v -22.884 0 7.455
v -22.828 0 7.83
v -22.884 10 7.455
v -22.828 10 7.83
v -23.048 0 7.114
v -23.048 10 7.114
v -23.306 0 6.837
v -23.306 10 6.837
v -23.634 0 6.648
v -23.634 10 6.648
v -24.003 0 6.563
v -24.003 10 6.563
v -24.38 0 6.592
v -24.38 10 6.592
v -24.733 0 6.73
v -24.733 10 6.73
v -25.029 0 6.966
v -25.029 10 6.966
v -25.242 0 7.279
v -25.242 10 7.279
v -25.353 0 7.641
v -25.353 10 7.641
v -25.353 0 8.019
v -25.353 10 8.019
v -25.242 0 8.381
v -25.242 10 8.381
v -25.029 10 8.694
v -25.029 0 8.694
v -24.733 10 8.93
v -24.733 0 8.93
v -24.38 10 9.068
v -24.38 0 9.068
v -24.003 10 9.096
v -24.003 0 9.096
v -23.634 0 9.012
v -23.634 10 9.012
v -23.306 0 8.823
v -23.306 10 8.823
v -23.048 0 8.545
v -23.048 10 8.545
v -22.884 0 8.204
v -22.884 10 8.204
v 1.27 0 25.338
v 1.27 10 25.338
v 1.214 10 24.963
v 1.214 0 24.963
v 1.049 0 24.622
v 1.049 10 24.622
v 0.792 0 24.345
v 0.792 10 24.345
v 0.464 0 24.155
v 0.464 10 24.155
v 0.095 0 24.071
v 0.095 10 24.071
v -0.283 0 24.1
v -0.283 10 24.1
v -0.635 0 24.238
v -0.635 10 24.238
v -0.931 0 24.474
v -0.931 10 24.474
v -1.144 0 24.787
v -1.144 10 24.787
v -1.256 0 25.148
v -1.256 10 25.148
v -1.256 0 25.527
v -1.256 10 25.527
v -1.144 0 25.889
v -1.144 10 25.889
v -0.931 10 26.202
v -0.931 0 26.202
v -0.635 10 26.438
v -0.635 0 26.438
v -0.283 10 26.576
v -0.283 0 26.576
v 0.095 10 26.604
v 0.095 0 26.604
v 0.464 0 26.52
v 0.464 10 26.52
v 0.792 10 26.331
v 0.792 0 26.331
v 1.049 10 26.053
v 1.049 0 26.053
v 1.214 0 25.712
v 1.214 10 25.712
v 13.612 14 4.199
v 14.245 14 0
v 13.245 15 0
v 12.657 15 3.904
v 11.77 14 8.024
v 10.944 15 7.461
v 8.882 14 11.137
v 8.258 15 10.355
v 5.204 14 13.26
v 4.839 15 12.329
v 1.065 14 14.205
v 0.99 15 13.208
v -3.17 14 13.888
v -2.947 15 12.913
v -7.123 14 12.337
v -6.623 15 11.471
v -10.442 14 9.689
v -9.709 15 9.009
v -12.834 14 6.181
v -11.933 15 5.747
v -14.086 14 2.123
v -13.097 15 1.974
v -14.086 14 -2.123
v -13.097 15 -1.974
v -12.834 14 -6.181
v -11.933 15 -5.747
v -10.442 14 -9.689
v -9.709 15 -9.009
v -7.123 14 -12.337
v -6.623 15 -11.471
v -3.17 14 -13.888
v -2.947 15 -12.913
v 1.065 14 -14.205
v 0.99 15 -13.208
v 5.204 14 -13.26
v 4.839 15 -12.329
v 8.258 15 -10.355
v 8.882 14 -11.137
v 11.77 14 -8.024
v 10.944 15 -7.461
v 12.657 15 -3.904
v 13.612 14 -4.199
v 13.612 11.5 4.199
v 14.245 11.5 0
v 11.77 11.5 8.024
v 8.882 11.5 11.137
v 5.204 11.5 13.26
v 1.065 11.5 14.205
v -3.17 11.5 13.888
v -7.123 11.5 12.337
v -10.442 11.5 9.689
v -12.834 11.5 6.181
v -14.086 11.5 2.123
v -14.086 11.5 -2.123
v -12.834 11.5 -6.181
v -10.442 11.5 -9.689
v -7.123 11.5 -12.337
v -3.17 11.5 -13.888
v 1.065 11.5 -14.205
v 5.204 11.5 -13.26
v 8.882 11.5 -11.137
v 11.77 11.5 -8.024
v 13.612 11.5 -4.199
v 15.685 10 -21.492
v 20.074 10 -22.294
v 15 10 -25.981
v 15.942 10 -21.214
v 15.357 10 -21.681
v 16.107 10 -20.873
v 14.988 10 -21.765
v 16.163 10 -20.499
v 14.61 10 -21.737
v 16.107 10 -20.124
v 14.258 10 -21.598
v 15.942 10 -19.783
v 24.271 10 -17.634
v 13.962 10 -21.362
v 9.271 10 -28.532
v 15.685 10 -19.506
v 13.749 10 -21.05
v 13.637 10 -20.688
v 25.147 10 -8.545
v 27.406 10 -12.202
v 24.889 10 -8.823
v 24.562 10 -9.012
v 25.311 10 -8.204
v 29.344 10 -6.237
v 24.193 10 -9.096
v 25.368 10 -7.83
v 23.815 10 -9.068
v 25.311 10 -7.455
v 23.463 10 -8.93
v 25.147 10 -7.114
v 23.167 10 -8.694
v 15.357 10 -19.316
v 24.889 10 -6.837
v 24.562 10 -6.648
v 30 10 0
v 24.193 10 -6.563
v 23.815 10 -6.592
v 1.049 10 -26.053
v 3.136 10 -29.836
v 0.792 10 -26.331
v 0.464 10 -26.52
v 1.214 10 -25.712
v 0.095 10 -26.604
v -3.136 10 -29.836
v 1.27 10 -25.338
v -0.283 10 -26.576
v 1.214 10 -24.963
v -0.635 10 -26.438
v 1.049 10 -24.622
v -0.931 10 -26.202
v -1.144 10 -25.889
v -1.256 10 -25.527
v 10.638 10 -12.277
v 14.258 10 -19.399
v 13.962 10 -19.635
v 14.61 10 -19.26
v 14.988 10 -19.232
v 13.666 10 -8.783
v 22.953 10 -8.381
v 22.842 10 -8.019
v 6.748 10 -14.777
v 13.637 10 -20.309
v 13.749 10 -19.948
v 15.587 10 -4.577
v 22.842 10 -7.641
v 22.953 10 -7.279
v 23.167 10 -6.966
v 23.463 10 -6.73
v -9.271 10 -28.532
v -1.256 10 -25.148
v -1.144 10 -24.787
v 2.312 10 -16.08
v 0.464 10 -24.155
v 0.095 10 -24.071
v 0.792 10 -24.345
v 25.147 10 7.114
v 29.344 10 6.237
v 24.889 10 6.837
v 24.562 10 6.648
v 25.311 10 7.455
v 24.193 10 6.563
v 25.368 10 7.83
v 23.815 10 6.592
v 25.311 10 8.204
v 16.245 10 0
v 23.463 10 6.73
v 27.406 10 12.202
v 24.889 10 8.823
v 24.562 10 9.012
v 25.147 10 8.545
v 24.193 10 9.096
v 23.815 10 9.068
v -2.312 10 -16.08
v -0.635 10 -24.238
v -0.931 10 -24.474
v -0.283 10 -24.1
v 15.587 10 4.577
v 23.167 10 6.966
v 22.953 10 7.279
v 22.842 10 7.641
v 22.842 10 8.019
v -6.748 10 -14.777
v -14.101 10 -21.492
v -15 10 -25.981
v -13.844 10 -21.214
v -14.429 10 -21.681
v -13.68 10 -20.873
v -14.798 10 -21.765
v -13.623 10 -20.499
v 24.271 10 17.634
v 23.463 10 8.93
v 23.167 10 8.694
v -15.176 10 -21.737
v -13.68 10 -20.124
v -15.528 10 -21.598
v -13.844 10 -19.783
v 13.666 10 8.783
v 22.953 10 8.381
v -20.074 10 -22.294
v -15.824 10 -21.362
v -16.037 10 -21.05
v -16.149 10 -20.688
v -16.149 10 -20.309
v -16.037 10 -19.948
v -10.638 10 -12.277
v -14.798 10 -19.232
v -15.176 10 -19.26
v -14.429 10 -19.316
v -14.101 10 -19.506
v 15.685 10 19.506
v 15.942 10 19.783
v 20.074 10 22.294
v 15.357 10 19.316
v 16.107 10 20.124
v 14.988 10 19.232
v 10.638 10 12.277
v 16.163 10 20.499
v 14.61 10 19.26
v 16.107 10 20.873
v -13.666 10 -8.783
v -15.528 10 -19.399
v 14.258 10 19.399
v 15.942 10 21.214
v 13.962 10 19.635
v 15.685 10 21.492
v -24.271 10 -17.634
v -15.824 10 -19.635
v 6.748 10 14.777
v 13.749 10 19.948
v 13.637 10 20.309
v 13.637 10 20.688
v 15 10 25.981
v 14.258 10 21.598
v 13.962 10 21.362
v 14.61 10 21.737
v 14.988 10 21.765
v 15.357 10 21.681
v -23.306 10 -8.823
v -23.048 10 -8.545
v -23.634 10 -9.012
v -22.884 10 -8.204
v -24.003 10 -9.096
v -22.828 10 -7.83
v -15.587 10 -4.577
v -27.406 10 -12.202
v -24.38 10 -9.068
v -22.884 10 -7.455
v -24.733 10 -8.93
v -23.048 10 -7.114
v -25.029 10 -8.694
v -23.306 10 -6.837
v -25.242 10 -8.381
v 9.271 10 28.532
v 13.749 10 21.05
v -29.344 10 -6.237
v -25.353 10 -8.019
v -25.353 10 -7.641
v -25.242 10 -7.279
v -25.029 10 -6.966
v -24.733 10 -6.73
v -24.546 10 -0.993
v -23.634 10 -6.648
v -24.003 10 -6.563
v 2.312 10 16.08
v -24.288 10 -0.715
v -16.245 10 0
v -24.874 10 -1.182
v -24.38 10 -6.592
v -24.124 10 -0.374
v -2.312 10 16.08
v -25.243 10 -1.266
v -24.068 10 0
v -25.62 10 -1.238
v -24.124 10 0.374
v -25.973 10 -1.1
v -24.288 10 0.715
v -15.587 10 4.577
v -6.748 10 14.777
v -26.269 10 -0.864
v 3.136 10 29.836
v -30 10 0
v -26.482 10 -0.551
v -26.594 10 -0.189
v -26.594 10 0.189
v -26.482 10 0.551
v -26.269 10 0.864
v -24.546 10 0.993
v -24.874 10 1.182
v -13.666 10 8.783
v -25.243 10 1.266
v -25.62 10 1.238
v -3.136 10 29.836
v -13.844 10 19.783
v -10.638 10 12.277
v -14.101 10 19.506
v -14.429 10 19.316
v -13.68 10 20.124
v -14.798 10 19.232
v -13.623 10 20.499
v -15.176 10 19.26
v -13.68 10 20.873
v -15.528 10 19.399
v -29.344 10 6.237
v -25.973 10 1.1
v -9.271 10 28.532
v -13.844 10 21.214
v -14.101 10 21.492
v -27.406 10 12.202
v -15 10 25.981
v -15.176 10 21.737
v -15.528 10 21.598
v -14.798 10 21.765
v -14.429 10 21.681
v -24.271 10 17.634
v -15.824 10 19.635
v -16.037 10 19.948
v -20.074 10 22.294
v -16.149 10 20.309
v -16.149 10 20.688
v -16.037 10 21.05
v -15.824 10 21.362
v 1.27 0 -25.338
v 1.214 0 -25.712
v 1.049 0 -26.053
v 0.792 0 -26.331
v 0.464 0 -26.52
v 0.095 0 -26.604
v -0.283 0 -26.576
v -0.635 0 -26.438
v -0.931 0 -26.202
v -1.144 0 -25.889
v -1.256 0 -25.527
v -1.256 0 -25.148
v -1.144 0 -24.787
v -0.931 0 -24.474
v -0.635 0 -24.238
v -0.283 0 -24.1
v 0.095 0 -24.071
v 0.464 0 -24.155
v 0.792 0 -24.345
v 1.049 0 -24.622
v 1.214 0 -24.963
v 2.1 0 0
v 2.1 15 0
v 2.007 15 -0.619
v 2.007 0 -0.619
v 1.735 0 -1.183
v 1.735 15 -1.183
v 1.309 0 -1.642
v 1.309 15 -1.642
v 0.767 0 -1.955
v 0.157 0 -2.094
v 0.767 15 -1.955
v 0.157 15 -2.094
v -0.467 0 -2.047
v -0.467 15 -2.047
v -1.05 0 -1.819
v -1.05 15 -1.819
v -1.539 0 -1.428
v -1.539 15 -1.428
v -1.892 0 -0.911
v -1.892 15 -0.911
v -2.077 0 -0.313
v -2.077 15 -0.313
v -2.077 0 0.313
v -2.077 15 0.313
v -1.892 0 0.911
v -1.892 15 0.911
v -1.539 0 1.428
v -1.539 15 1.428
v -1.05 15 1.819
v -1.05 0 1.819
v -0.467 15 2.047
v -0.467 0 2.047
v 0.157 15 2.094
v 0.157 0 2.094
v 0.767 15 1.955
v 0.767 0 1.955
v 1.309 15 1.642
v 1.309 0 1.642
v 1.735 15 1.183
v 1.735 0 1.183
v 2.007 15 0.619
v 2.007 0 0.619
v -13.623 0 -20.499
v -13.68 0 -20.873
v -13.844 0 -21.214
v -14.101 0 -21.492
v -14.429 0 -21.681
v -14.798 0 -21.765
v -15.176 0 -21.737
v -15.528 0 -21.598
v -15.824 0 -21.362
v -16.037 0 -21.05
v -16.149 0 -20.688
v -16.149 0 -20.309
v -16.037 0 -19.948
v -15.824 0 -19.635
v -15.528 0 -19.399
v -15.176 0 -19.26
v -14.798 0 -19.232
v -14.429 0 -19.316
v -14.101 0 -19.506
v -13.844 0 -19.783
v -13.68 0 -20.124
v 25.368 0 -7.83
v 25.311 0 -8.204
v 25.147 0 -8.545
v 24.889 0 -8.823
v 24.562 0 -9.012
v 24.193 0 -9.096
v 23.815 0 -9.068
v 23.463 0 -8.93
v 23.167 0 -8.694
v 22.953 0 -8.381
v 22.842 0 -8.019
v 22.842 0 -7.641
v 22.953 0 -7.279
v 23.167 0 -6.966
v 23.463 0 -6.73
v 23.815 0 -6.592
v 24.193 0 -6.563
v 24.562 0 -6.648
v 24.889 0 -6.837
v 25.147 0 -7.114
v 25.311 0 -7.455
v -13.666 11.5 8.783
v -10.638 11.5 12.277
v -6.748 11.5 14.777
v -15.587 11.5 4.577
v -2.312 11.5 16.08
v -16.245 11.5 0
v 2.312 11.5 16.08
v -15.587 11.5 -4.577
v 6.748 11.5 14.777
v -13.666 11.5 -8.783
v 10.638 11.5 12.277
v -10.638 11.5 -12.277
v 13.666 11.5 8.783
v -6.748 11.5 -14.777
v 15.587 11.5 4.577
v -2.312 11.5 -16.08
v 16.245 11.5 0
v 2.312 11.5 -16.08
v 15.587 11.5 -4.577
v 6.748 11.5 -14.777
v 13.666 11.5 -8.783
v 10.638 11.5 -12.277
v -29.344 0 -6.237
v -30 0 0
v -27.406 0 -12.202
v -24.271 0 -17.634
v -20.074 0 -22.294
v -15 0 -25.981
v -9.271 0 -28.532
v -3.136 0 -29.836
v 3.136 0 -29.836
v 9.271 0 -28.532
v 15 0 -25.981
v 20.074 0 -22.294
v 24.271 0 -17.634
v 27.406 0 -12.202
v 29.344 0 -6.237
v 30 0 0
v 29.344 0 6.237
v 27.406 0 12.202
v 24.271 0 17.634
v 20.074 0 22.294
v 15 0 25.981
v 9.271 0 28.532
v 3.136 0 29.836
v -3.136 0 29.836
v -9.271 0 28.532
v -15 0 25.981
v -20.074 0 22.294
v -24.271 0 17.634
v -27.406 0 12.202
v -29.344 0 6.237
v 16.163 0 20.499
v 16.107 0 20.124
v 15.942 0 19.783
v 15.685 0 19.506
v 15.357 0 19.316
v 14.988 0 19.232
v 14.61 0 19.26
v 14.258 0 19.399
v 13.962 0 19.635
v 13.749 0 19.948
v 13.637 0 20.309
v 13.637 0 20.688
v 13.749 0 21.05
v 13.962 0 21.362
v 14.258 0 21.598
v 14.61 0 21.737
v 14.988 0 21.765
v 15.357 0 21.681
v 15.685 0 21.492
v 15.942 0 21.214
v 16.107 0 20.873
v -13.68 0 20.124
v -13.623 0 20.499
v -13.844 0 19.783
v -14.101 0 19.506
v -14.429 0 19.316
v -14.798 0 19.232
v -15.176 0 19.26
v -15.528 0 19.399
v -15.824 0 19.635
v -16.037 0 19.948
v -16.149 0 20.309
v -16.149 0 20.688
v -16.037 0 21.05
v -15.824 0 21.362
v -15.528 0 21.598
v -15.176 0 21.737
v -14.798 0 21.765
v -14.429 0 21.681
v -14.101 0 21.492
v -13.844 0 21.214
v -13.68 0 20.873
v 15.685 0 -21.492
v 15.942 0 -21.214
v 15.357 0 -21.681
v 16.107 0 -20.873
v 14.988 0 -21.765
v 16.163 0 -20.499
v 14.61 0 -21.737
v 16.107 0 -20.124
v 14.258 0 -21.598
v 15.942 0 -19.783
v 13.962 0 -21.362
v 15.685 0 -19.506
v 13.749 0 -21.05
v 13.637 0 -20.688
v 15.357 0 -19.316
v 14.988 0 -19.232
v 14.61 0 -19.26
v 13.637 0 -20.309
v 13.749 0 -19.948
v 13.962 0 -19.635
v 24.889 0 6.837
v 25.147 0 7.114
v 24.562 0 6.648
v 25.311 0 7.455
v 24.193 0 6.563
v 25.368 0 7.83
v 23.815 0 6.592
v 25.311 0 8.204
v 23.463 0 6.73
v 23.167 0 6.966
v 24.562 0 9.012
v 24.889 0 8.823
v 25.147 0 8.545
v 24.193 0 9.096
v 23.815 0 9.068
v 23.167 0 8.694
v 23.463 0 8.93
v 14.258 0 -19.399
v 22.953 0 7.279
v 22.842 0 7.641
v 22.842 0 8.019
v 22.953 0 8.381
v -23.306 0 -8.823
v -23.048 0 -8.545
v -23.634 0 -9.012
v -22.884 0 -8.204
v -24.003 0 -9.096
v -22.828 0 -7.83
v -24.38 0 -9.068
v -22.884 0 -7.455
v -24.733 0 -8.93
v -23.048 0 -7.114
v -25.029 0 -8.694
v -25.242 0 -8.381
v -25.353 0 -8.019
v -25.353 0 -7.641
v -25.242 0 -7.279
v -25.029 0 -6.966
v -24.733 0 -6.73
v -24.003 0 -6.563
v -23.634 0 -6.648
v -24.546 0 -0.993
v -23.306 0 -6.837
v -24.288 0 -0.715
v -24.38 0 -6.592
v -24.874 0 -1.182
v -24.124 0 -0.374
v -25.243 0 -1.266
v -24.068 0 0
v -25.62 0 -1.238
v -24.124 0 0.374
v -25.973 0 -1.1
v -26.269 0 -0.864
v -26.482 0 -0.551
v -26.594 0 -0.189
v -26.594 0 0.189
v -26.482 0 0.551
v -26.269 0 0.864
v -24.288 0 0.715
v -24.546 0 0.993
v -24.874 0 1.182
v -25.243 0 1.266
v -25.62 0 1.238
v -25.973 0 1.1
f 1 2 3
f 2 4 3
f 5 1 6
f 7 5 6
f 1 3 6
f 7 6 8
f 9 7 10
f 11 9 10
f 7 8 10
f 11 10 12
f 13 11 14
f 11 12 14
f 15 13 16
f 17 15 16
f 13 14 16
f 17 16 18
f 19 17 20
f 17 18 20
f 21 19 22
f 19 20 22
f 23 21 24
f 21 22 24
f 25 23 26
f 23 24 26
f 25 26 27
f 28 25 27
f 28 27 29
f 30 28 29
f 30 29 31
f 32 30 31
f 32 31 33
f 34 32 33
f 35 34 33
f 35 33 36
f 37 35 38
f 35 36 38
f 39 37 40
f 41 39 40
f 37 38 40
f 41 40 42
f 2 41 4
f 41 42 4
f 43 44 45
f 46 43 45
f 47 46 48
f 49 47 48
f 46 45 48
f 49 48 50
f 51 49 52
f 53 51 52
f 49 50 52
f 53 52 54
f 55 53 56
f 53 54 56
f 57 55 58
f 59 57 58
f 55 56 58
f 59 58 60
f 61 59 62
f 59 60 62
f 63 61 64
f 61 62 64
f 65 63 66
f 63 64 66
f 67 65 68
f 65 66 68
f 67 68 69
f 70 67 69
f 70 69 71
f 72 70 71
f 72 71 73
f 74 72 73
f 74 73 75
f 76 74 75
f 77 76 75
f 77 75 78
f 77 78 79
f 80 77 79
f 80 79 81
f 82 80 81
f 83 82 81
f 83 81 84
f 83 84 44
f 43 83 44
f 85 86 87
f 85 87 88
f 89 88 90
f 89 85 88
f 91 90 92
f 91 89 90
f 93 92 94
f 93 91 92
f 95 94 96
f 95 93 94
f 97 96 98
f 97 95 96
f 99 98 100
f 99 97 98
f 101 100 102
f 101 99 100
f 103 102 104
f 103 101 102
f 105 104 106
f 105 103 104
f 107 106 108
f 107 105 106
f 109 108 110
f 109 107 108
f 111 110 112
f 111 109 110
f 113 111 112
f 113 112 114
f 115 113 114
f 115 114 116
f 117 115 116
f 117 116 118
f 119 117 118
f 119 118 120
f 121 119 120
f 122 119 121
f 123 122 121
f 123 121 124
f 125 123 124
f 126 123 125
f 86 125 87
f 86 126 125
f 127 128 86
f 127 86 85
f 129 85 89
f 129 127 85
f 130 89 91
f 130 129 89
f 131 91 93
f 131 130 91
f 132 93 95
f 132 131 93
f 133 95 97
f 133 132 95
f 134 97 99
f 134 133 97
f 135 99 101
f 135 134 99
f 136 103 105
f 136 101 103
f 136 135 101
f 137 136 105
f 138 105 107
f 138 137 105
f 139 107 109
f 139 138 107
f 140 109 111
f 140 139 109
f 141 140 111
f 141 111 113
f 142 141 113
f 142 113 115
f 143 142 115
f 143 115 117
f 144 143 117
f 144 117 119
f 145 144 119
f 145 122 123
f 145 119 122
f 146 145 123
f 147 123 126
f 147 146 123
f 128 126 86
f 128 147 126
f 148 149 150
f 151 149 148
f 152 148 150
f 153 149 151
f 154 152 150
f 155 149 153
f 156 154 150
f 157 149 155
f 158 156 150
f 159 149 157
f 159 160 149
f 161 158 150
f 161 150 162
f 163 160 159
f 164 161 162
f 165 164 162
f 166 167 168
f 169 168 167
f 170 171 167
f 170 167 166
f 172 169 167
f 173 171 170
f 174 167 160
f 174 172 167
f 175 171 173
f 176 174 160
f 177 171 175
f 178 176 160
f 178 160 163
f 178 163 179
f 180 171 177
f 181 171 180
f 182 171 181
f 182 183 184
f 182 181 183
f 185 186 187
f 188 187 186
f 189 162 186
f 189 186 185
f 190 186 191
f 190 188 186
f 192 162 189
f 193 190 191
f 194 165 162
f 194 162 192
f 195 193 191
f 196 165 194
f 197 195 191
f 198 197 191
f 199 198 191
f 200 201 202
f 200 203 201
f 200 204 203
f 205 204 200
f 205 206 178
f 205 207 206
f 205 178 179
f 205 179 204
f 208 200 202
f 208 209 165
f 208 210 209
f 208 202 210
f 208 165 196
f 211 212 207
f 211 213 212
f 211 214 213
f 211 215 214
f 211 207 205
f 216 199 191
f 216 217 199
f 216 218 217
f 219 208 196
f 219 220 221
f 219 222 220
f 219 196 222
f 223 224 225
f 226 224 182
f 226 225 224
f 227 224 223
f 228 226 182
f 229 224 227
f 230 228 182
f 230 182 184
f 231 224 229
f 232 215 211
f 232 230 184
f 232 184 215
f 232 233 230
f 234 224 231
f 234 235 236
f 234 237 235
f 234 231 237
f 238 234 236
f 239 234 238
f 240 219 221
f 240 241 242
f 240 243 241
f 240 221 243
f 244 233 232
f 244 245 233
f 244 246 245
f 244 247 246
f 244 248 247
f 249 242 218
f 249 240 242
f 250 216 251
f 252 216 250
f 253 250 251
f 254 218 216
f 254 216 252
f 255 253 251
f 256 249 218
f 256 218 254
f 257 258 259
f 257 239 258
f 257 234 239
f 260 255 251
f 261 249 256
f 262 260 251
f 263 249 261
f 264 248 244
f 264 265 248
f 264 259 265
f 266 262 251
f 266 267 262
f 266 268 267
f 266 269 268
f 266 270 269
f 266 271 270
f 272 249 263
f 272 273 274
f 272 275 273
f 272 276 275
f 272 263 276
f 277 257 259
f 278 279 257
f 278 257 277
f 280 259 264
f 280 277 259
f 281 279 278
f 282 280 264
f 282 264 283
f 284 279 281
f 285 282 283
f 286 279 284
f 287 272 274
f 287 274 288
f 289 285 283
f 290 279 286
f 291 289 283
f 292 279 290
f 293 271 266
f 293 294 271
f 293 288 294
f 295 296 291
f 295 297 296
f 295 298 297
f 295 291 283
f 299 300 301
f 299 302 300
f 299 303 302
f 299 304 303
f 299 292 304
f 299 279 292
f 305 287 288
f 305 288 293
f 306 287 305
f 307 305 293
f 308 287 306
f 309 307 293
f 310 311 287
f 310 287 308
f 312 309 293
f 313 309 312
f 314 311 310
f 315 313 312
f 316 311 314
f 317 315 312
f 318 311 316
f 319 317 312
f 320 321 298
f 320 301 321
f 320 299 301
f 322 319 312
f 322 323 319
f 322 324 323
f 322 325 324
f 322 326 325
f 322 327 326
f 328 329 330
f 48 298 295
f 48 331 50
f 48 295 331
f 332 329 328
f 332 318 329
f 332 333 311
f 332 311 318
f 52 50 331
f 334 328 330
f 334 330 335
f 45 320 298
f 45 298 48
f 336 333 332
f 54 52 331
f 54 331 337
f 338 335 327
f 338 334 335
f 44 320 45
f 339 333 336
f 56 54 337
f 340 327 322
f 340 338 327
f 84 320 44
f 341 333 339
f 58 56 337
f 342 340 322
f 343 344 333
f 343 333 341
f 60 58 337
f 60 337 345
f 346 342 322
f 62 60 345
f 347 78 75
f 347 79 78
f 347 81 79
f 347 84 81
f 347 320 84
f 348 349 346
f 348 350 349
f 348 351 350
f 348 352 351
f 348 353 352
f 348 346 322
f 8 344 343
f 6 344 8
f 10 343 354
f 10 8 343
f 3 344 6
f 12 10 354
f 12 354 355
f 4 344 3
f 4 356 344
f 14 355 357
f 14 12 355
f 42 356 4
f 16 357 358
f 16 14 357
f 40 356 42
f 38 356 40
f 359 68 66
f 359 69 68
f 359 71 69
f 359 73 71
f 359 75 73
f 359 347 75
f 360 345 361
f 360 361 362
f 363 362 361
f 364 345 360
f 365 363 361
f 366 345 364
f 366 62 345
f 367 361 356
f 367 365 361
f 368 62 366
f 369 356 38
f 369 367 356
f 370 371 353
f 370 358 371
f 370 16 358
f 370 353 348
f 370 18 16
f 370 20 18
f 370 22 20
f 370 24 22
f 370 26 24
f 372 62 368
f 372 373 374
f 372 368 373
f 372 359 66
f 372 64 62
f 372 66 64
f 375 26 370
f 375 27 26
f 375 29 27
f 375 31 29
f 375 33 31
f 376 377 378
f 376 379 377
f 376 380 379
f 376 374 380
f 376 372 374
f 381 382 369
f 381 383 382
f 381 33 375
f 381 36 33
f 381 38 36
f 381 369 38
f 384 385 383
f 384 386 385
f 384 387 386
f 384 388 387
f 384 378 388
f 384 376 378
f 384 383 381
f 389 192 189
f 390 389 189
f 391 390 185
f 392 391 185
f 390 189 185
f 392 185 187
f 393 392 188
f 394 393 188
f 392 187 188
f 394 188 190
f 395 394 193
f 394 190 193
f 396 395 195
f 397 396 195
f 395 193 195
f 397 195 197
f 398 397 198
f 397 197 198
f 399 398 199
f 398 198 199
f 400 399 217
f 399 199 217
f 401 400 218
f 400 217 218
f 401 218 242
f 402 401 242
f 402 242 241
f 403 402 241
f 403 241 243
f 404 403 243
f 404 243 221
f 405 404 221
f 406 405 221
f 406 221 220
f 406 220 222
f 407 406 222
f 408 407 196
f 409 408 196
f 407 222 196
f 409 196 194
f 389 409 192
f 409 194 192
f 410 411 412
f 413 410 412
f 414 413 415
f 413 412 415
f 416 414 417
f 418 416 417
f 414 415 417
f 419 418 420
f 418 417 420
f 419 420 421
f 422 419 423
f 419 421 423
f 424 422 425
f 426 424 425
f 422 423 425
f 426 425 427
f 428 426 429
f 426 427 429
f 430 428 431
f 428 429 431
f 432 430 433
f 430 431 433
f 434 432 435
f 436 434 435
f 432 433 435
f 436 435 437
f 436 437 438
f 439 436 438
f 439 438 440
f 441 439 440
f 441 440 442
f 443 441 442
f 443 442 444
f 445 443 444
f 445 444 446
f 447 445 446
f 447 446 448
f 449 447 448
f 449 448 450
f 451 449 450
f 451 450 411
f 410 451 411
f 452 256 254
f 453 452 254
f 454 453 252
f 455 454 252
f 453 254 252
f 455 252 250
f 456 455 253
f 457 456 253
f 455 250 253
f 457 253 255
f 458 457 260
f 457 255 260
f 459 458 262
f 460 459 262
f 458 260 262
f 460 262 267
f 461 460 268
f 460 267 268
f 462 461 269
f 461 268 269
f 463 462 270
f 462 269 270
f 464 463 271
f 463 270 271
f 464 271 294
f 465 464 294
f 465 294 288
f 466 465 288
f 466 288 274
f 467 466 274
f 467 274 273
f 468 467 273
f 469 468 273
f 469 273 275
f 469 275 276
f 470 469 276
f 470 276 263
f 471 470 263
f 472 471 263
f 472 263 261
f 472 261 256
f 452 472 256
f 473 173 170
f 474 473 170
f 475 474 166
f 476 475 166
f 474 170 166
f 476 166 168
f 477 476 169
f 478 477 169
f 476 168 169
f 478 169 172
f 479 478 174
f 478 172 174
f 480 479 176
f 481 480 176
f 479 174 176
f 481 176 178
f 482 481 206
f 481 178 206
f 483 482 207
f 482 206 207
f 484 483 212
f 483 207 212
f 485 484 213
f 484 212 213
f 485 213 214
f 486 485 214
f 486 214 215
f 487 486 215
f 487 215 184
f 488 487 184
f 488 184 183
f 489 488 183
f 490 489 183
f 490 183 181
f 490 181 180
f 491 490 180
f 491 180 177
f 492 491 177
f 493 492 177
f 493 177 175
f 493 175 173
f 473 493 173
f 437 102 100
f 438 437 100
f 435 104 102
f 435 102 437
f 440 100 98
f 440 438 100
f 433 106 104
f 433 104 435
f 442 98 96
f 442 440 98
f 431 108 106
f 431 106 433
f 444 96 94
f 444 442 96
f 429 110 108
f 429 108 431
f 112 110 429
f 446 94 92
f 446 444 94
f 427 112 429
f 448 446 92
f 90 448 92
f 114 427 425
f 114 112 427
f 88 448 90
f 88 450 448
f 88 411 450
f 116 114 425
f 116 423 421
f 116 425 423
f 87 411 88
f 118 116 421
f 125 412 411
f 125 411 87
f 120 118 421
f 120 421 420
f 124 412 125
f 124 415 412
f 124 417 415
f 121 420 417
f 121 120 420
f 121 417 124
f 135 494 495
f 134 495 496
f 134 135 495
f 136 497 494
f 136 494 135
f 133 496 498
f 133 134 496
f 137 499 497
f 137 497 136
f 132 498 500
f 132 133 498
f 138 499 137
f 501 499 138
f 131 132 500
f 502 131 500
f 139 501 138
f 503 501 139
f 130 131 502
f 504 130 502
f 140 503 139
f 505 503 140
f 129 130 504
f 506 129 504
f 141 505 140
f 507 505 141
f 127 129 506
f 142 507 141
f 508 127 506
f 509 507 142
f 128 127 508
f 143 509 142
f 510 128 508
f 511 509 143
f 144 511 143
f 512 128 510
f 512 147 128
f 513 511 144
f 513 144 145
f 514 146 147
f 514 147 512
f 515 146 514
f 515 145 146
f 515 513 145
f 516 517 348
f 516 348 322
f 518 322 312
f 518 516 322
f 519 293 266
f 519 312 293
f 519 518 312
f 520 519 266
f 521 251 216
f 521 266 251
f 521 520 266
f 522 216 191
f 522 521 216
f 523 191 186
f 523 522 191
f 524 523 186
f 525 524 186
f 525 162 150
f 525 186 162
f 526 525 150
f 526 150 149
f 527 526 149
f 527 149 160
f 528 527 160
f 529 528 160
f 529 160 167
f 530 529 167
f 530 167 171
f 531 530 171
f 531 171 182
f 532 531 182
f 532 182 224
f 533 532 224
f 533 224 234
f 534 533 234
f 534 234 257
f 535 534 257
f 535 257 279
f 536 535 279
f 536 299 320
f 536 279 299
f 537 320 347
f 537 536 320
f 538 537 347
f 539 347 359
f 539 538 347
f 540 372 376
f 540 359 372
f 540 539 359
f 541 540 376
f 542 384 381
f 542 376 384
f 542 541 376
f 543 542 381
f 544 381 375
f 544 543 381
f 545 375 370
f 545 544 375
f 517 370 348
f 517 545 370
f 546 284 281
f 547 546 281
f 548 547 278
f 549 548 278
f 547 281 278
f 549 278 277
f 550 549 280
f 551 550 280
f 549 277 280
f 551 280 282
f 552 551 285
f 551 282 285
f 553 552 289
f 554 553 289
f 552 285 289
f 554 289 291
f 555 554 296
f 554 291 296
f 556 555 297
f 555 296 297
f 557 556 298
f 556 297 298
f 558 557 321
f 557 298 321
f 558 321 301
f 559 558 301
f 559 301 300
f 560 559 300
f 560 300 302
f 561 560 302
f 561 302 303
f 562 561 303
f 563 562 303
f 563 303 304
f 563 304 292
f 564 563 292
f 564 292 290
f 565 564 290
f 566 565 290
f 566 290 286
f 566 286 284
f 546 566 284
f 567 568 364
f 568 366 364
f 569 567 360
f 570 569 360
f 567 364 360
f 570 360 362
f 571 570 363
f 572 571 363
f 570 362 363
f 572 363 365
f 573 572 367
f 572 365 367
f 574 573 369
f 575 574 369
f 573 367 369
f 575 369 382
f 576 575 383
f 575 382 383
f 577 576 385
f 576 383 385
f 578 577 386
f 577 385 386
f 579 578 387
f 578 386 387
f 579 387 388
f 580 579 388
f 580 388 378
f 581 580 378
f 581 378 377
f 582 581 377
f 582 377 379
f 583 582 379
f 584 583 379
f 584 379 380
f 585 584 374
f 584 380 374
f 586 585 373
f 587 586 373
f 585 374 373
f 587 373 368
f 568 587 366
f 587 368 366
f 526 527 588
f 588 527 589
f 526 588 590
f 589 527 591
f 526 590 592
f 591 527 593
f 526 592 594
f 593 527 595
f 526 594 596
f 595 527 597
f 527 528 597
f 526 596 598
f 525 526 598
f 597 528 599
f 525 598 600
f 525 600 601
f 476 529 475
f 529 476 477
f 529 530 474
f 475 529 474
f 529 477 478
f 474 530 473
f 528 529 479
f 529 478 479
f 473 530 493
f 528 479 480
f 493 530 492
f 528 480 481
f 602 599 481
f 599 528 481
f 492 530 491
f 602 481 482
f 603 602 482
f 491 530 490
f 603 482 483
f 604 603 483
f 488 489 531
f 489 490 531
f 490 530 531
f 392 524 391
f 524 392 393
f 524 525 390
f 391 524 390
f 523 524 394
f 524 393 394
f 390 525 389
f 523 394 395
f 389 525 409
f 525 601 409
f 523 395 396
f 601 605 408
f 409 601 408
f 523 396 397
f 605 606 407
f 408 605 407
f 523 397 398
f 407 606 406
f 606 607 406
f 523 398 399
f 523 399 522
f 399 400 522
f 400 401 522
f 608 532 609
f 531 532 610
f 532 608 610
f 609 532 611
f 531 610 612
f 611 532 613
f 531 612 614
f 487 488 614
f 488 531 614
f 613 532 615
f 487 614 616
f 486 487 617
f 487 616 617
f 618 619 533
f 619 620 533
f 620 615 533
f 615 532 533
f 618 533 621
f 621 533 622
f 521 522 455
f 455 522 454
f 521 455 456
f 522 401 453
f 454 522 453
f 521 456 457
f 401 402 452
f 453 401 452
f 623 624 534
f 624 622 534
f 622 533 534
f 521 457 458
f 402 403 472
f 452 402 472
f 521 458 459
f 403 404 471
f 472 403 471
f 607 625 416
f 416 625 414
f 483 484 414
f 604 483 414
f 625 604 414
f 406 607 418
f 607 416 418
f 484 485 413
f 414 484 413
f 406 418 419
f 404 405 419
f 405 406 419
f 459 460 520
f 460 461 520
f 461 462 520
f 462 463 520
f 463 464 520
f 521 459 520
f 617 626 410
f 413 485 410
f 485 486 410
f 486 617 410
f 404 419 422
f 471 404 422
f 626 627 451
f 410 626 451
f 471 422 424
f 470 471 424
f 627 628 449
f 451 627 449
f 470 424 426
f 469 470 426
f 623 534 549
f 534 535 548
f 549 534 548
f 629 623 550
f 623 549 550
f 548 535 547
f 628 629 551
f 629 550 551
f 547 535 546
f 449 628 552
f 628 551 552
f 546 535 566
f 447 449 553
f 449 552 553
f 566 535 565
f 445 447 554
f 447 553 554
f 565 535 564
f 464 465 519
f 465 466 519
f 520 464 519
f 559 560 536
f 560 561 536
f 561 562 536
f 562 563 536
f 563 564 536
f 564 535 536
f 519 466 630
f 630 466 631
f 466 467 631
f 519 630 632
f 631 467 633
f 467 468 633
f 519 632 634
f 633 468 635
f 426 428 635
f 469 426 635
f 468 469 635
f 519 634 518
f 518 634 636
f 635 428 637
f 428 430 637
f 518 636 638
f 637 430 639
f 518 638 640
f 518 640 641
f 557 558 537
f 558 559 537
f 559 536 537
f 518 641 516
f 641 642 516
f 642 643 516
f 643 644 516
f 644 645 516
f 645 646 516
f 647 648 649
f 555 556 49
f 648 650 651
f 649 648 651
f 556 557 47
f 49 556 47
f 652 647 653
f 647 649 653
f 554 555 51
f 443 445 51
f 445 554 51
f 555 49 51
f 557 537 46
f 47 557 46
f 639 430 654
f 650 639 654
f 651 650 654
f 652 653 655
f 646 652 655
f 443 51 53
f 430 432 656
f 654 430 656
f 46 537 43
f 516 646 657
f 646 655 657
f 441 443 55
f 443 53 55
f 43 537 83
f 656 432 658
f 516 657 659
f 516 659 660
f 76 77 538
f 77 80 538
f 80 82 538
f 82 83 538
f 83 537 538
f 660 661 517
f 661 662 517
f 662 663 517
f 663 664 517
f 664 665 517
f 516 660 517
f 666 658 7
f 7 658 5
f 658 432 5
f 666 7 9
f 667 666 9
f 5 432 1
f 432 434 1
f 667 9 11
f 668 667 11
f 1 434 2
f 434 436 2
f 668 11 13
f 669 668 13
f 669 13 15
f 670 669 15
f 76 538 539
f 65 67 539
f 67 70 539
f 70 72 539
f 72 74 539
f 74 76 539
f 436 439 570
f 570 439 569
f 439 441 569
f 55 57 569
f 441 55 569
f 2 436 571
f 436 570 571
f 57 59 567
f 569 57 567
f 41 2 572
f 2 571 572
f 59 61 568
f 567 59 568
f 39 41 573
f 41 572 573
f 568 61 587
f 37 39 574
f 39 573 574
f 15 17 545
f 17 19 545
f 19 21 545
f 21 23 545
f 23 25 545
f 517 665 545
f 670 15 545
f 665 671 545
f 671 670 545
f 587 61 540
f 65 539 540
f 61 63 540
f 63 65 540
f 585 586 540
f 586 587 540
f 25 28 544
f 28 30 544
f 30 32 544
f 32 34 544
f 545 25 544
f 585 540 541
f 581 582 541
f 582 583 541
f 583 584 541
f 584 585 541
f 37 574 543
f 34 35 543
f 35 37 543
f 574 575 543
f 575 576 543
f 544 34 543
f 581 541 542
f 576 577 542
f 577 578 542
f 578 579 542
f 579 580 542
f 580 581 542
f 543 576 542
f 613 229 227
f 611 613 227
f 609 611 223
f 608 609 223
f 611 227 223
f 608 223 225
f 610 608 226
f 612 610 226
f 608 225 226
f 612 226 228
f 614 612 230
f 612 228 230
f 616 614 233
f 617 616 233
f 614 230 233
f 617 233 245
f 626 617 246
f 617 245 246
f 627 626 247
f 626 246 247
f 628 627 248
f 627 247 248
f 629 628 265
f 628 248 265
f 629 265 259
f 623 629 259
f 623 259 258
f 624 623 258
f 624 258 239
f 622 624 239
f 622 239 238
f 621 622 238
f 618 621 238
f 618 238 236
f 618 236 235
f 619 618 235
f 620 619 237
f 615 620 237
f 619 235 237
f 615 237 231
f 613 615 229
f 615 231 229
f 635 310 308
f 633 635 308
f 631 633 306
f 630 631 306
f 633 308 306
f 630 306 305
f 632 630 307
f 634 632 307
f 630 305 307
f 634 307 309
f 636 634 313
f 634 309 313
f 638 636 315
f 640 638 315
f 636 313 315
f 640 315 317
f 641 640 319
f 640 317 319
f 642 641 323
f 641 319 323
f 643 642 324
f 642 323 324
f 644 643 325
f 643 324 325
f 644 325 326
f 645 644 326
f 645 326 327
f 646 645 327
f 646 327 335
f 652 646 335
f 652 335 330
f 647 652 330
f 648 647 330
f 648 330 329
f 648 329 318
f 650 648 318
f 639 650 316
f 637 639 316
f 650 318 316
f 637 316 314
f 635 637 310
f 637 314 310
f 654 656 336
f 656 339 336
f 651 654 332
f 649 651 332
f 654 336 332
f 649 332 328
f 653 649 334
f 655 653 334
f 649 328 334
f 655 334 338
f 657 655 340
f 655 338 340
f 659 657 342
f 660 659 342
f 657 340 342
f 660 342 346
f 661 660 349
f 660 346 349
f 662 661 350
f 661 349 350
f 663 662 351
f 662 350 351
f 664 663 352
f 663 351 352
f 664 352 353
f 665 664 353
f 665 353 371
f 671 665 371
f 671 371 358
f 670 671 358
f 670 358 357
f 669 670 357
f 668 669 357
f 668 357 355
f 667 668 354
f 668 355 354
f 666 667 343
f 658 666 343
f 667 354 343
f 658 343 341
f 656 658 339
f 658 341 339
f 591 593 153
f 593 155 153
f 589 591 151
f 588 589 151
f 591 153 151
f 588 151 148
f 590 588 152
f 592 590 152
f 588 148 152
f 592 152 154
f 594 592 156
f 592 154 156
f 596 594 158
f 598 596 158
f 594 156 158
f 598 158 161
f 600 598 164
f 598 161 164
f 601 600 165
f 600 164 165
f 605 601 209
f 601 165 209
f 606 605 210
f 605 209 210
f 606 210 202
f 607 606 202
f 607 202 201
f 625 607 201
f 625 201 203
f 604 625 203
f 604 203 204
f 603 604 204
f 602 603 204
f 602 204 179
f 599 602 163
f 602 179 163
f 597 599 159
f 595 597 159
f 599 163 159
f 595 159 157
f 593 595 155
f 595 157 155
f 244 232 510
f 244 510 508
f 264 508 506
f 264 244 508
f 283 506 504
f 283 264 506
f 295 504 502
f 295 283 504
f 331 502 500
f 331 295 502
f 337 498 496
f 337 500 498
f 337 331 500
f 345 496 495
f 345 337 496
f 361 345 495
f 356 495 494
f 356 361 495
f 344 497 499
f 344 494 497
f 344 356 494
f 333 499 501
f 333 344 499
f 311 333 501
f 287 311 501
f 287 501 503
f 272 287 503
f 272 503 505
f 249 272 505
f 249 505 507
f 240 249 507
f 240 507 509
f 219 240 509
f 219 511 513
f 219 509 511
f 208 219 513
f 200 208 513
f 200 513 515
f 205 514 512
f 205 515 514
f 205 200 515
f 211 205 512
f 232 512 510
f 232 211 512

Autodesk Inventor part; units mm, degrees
ref_plane "YZ Plane" through (0, 0, 0) normal (1, 0, 0) x (0, 1, 0)
ref_plane "XZ Plane" through (0, 0, 0) normal (0, 1, 0) x (-1, 0, 0)
ref_plane "XY Plane" through (0, 0, 0) normal (0, 0, 1) x (1, 0, 0)
sketch "Sketch1" plane through (0, 0, 0) normal (0, 1, 0) x (-1, 0, 0)
  circle A0 centre (0, 0) radius 30
  dimension "d0" = 60
extrude "Extrusion1" add sketch "Sketch1" along normal blind 10
sketch "Sketch2" plane through (0, 10, 0) normal (0, 1, 0) x (1, 0, 0)
  circle A0 centre (0, 0) radius 14.245
  dimension "d3" = 28.49
extrude "Extrusion2" add sketch "Sketch2" along normal blind 5
sketch "Sketch3" plane through (0, 10, 0) normal (0, 1, 0) x (1, 0, 0)
  circle A0 centre (-25.3377, 0) radius 1.27
  point P0 (0, 0)
  dimension "d6" = 2.54
  dimension "d7" = 25.3377
extrude "Extrusion3" cut sketch "Sketch3" against normal up to surface (10 mm away)
sketch "Sketch4" plane through (0, 15, 0) normal (0, 1, 0) x (1, 0, 0)
  circle A0 centre (0, 0) radius 2.1
  dimension "d10" = 4.2
extrude "Extrusion4" cut sketch "Sketch4" against normal up to surface (15 mm away)
chamfer "Chamfer1" distance 1 angle 45 1 edges at (-14.245, 15, 0)
sketch "Sketch6" plane through (0, 10, 0) normal (0, 1, 0) x (1, 0, 0)
  circle A0 centre (-25.3377, 0) radius 1.27 projected
  circle A1 centre (-25.3377, 0) radius 1.27 projected
  line L0 (-25.3377, 0) -> (0, 0) construction
  line L1 (0, 0) -> (-24.0976, 7.8298) construction
  circle A2 centre (0, 0) radius 25.3377 construction
  circle A3 centre (-24.0976, 7.8298) radius 1.27
  circle A4 centre (-24.0976, -7.8298) radius 1.27
  circle A5 centre (-14.8931, -20.4986) radius 1.27
  circle A6 centre (0, -25.3377) radius 1.27
  circle A7 centre (14.8931, -20.4986) radius 1.27
  circle A8 centre (24.0976, -7.8298) radius 1.27
  circle A9 centre (24.0976, 7.8298) radius 1.27
  circle A10 centre (14.8931, 20.4986) radius 1.27
  circle A11 centre (0, 25.3377) radius 1.27
  circle A12 centre (-14.8931, 20.4986) radius 1.27
  point P0 (-24.9704, -1.2157)
  point P1 (-24.9704, 1.2157)
  dimension "d22" = 18
  dimension "d23" = 2.54
  dimension "d24" = 2.54
  dimension "d27" = 360
extrude "Extrusion6" cut sketch "Sketch6" against normal up to surface (10 mm away) contours A3 | A4 | A5 | A6 | A7 | A8 | A9 | A10 | A11 | A12
sketch "Sketch7" plane through (0, 10, 0) normal (0, 1, 0) x (1, 0, 0)
  circle A0 centre (0, 0) radius 14.245 projected
  circle A1 centre (0, 0) radius 16.245
  dimension "d31" = 2
extrude "Extrusion7" add sketch "Sketch7" along normal blind 1.5
sketch "Sketch8" plane through (0, 10, 0) normal (0, 1, 0) x (1, 0, 0)
  circle A0 centre (0, 0) radius 16.245 projected
  circle A1 centre (0, -25.3377) radius 1.27 projected
  circle A2 centre (-24.0976, -7.8298) radius 1.27 projected
  circle A3 centre (-14.8931, 20.4986) radius 1.27 projected
  circle A4 centre (24.0976, -7.8298) radius 1.27 projected
  circle A5 centre (24.0976, 7.8298) radius 1.27 projected
  circle A6 centre (-24.0976, 7.8298) radius 1.27 projected
  circle A7 centre (-14.8931, -20.4986) radius 1.27 projected
  circle A8 centre (0, 25.3377) radius 1.27 projected
  circle A9 centre (14.8931, -20.4986) radius 1.27 projected
  circle A10 centre (14.8931, 20.4986) radius 1.27 projected
  circle A11 centre (-25.3377, 0) radius 1.27 projected
  circle A12 centre (0, 0) radius 30 projected
  circle A13 centre (0, 0) radius 16.245 projected
  circle A14 centre (0, 0) radius 14.245 projected
equation "\"d24\" = d23"
properties part number "bottom"
